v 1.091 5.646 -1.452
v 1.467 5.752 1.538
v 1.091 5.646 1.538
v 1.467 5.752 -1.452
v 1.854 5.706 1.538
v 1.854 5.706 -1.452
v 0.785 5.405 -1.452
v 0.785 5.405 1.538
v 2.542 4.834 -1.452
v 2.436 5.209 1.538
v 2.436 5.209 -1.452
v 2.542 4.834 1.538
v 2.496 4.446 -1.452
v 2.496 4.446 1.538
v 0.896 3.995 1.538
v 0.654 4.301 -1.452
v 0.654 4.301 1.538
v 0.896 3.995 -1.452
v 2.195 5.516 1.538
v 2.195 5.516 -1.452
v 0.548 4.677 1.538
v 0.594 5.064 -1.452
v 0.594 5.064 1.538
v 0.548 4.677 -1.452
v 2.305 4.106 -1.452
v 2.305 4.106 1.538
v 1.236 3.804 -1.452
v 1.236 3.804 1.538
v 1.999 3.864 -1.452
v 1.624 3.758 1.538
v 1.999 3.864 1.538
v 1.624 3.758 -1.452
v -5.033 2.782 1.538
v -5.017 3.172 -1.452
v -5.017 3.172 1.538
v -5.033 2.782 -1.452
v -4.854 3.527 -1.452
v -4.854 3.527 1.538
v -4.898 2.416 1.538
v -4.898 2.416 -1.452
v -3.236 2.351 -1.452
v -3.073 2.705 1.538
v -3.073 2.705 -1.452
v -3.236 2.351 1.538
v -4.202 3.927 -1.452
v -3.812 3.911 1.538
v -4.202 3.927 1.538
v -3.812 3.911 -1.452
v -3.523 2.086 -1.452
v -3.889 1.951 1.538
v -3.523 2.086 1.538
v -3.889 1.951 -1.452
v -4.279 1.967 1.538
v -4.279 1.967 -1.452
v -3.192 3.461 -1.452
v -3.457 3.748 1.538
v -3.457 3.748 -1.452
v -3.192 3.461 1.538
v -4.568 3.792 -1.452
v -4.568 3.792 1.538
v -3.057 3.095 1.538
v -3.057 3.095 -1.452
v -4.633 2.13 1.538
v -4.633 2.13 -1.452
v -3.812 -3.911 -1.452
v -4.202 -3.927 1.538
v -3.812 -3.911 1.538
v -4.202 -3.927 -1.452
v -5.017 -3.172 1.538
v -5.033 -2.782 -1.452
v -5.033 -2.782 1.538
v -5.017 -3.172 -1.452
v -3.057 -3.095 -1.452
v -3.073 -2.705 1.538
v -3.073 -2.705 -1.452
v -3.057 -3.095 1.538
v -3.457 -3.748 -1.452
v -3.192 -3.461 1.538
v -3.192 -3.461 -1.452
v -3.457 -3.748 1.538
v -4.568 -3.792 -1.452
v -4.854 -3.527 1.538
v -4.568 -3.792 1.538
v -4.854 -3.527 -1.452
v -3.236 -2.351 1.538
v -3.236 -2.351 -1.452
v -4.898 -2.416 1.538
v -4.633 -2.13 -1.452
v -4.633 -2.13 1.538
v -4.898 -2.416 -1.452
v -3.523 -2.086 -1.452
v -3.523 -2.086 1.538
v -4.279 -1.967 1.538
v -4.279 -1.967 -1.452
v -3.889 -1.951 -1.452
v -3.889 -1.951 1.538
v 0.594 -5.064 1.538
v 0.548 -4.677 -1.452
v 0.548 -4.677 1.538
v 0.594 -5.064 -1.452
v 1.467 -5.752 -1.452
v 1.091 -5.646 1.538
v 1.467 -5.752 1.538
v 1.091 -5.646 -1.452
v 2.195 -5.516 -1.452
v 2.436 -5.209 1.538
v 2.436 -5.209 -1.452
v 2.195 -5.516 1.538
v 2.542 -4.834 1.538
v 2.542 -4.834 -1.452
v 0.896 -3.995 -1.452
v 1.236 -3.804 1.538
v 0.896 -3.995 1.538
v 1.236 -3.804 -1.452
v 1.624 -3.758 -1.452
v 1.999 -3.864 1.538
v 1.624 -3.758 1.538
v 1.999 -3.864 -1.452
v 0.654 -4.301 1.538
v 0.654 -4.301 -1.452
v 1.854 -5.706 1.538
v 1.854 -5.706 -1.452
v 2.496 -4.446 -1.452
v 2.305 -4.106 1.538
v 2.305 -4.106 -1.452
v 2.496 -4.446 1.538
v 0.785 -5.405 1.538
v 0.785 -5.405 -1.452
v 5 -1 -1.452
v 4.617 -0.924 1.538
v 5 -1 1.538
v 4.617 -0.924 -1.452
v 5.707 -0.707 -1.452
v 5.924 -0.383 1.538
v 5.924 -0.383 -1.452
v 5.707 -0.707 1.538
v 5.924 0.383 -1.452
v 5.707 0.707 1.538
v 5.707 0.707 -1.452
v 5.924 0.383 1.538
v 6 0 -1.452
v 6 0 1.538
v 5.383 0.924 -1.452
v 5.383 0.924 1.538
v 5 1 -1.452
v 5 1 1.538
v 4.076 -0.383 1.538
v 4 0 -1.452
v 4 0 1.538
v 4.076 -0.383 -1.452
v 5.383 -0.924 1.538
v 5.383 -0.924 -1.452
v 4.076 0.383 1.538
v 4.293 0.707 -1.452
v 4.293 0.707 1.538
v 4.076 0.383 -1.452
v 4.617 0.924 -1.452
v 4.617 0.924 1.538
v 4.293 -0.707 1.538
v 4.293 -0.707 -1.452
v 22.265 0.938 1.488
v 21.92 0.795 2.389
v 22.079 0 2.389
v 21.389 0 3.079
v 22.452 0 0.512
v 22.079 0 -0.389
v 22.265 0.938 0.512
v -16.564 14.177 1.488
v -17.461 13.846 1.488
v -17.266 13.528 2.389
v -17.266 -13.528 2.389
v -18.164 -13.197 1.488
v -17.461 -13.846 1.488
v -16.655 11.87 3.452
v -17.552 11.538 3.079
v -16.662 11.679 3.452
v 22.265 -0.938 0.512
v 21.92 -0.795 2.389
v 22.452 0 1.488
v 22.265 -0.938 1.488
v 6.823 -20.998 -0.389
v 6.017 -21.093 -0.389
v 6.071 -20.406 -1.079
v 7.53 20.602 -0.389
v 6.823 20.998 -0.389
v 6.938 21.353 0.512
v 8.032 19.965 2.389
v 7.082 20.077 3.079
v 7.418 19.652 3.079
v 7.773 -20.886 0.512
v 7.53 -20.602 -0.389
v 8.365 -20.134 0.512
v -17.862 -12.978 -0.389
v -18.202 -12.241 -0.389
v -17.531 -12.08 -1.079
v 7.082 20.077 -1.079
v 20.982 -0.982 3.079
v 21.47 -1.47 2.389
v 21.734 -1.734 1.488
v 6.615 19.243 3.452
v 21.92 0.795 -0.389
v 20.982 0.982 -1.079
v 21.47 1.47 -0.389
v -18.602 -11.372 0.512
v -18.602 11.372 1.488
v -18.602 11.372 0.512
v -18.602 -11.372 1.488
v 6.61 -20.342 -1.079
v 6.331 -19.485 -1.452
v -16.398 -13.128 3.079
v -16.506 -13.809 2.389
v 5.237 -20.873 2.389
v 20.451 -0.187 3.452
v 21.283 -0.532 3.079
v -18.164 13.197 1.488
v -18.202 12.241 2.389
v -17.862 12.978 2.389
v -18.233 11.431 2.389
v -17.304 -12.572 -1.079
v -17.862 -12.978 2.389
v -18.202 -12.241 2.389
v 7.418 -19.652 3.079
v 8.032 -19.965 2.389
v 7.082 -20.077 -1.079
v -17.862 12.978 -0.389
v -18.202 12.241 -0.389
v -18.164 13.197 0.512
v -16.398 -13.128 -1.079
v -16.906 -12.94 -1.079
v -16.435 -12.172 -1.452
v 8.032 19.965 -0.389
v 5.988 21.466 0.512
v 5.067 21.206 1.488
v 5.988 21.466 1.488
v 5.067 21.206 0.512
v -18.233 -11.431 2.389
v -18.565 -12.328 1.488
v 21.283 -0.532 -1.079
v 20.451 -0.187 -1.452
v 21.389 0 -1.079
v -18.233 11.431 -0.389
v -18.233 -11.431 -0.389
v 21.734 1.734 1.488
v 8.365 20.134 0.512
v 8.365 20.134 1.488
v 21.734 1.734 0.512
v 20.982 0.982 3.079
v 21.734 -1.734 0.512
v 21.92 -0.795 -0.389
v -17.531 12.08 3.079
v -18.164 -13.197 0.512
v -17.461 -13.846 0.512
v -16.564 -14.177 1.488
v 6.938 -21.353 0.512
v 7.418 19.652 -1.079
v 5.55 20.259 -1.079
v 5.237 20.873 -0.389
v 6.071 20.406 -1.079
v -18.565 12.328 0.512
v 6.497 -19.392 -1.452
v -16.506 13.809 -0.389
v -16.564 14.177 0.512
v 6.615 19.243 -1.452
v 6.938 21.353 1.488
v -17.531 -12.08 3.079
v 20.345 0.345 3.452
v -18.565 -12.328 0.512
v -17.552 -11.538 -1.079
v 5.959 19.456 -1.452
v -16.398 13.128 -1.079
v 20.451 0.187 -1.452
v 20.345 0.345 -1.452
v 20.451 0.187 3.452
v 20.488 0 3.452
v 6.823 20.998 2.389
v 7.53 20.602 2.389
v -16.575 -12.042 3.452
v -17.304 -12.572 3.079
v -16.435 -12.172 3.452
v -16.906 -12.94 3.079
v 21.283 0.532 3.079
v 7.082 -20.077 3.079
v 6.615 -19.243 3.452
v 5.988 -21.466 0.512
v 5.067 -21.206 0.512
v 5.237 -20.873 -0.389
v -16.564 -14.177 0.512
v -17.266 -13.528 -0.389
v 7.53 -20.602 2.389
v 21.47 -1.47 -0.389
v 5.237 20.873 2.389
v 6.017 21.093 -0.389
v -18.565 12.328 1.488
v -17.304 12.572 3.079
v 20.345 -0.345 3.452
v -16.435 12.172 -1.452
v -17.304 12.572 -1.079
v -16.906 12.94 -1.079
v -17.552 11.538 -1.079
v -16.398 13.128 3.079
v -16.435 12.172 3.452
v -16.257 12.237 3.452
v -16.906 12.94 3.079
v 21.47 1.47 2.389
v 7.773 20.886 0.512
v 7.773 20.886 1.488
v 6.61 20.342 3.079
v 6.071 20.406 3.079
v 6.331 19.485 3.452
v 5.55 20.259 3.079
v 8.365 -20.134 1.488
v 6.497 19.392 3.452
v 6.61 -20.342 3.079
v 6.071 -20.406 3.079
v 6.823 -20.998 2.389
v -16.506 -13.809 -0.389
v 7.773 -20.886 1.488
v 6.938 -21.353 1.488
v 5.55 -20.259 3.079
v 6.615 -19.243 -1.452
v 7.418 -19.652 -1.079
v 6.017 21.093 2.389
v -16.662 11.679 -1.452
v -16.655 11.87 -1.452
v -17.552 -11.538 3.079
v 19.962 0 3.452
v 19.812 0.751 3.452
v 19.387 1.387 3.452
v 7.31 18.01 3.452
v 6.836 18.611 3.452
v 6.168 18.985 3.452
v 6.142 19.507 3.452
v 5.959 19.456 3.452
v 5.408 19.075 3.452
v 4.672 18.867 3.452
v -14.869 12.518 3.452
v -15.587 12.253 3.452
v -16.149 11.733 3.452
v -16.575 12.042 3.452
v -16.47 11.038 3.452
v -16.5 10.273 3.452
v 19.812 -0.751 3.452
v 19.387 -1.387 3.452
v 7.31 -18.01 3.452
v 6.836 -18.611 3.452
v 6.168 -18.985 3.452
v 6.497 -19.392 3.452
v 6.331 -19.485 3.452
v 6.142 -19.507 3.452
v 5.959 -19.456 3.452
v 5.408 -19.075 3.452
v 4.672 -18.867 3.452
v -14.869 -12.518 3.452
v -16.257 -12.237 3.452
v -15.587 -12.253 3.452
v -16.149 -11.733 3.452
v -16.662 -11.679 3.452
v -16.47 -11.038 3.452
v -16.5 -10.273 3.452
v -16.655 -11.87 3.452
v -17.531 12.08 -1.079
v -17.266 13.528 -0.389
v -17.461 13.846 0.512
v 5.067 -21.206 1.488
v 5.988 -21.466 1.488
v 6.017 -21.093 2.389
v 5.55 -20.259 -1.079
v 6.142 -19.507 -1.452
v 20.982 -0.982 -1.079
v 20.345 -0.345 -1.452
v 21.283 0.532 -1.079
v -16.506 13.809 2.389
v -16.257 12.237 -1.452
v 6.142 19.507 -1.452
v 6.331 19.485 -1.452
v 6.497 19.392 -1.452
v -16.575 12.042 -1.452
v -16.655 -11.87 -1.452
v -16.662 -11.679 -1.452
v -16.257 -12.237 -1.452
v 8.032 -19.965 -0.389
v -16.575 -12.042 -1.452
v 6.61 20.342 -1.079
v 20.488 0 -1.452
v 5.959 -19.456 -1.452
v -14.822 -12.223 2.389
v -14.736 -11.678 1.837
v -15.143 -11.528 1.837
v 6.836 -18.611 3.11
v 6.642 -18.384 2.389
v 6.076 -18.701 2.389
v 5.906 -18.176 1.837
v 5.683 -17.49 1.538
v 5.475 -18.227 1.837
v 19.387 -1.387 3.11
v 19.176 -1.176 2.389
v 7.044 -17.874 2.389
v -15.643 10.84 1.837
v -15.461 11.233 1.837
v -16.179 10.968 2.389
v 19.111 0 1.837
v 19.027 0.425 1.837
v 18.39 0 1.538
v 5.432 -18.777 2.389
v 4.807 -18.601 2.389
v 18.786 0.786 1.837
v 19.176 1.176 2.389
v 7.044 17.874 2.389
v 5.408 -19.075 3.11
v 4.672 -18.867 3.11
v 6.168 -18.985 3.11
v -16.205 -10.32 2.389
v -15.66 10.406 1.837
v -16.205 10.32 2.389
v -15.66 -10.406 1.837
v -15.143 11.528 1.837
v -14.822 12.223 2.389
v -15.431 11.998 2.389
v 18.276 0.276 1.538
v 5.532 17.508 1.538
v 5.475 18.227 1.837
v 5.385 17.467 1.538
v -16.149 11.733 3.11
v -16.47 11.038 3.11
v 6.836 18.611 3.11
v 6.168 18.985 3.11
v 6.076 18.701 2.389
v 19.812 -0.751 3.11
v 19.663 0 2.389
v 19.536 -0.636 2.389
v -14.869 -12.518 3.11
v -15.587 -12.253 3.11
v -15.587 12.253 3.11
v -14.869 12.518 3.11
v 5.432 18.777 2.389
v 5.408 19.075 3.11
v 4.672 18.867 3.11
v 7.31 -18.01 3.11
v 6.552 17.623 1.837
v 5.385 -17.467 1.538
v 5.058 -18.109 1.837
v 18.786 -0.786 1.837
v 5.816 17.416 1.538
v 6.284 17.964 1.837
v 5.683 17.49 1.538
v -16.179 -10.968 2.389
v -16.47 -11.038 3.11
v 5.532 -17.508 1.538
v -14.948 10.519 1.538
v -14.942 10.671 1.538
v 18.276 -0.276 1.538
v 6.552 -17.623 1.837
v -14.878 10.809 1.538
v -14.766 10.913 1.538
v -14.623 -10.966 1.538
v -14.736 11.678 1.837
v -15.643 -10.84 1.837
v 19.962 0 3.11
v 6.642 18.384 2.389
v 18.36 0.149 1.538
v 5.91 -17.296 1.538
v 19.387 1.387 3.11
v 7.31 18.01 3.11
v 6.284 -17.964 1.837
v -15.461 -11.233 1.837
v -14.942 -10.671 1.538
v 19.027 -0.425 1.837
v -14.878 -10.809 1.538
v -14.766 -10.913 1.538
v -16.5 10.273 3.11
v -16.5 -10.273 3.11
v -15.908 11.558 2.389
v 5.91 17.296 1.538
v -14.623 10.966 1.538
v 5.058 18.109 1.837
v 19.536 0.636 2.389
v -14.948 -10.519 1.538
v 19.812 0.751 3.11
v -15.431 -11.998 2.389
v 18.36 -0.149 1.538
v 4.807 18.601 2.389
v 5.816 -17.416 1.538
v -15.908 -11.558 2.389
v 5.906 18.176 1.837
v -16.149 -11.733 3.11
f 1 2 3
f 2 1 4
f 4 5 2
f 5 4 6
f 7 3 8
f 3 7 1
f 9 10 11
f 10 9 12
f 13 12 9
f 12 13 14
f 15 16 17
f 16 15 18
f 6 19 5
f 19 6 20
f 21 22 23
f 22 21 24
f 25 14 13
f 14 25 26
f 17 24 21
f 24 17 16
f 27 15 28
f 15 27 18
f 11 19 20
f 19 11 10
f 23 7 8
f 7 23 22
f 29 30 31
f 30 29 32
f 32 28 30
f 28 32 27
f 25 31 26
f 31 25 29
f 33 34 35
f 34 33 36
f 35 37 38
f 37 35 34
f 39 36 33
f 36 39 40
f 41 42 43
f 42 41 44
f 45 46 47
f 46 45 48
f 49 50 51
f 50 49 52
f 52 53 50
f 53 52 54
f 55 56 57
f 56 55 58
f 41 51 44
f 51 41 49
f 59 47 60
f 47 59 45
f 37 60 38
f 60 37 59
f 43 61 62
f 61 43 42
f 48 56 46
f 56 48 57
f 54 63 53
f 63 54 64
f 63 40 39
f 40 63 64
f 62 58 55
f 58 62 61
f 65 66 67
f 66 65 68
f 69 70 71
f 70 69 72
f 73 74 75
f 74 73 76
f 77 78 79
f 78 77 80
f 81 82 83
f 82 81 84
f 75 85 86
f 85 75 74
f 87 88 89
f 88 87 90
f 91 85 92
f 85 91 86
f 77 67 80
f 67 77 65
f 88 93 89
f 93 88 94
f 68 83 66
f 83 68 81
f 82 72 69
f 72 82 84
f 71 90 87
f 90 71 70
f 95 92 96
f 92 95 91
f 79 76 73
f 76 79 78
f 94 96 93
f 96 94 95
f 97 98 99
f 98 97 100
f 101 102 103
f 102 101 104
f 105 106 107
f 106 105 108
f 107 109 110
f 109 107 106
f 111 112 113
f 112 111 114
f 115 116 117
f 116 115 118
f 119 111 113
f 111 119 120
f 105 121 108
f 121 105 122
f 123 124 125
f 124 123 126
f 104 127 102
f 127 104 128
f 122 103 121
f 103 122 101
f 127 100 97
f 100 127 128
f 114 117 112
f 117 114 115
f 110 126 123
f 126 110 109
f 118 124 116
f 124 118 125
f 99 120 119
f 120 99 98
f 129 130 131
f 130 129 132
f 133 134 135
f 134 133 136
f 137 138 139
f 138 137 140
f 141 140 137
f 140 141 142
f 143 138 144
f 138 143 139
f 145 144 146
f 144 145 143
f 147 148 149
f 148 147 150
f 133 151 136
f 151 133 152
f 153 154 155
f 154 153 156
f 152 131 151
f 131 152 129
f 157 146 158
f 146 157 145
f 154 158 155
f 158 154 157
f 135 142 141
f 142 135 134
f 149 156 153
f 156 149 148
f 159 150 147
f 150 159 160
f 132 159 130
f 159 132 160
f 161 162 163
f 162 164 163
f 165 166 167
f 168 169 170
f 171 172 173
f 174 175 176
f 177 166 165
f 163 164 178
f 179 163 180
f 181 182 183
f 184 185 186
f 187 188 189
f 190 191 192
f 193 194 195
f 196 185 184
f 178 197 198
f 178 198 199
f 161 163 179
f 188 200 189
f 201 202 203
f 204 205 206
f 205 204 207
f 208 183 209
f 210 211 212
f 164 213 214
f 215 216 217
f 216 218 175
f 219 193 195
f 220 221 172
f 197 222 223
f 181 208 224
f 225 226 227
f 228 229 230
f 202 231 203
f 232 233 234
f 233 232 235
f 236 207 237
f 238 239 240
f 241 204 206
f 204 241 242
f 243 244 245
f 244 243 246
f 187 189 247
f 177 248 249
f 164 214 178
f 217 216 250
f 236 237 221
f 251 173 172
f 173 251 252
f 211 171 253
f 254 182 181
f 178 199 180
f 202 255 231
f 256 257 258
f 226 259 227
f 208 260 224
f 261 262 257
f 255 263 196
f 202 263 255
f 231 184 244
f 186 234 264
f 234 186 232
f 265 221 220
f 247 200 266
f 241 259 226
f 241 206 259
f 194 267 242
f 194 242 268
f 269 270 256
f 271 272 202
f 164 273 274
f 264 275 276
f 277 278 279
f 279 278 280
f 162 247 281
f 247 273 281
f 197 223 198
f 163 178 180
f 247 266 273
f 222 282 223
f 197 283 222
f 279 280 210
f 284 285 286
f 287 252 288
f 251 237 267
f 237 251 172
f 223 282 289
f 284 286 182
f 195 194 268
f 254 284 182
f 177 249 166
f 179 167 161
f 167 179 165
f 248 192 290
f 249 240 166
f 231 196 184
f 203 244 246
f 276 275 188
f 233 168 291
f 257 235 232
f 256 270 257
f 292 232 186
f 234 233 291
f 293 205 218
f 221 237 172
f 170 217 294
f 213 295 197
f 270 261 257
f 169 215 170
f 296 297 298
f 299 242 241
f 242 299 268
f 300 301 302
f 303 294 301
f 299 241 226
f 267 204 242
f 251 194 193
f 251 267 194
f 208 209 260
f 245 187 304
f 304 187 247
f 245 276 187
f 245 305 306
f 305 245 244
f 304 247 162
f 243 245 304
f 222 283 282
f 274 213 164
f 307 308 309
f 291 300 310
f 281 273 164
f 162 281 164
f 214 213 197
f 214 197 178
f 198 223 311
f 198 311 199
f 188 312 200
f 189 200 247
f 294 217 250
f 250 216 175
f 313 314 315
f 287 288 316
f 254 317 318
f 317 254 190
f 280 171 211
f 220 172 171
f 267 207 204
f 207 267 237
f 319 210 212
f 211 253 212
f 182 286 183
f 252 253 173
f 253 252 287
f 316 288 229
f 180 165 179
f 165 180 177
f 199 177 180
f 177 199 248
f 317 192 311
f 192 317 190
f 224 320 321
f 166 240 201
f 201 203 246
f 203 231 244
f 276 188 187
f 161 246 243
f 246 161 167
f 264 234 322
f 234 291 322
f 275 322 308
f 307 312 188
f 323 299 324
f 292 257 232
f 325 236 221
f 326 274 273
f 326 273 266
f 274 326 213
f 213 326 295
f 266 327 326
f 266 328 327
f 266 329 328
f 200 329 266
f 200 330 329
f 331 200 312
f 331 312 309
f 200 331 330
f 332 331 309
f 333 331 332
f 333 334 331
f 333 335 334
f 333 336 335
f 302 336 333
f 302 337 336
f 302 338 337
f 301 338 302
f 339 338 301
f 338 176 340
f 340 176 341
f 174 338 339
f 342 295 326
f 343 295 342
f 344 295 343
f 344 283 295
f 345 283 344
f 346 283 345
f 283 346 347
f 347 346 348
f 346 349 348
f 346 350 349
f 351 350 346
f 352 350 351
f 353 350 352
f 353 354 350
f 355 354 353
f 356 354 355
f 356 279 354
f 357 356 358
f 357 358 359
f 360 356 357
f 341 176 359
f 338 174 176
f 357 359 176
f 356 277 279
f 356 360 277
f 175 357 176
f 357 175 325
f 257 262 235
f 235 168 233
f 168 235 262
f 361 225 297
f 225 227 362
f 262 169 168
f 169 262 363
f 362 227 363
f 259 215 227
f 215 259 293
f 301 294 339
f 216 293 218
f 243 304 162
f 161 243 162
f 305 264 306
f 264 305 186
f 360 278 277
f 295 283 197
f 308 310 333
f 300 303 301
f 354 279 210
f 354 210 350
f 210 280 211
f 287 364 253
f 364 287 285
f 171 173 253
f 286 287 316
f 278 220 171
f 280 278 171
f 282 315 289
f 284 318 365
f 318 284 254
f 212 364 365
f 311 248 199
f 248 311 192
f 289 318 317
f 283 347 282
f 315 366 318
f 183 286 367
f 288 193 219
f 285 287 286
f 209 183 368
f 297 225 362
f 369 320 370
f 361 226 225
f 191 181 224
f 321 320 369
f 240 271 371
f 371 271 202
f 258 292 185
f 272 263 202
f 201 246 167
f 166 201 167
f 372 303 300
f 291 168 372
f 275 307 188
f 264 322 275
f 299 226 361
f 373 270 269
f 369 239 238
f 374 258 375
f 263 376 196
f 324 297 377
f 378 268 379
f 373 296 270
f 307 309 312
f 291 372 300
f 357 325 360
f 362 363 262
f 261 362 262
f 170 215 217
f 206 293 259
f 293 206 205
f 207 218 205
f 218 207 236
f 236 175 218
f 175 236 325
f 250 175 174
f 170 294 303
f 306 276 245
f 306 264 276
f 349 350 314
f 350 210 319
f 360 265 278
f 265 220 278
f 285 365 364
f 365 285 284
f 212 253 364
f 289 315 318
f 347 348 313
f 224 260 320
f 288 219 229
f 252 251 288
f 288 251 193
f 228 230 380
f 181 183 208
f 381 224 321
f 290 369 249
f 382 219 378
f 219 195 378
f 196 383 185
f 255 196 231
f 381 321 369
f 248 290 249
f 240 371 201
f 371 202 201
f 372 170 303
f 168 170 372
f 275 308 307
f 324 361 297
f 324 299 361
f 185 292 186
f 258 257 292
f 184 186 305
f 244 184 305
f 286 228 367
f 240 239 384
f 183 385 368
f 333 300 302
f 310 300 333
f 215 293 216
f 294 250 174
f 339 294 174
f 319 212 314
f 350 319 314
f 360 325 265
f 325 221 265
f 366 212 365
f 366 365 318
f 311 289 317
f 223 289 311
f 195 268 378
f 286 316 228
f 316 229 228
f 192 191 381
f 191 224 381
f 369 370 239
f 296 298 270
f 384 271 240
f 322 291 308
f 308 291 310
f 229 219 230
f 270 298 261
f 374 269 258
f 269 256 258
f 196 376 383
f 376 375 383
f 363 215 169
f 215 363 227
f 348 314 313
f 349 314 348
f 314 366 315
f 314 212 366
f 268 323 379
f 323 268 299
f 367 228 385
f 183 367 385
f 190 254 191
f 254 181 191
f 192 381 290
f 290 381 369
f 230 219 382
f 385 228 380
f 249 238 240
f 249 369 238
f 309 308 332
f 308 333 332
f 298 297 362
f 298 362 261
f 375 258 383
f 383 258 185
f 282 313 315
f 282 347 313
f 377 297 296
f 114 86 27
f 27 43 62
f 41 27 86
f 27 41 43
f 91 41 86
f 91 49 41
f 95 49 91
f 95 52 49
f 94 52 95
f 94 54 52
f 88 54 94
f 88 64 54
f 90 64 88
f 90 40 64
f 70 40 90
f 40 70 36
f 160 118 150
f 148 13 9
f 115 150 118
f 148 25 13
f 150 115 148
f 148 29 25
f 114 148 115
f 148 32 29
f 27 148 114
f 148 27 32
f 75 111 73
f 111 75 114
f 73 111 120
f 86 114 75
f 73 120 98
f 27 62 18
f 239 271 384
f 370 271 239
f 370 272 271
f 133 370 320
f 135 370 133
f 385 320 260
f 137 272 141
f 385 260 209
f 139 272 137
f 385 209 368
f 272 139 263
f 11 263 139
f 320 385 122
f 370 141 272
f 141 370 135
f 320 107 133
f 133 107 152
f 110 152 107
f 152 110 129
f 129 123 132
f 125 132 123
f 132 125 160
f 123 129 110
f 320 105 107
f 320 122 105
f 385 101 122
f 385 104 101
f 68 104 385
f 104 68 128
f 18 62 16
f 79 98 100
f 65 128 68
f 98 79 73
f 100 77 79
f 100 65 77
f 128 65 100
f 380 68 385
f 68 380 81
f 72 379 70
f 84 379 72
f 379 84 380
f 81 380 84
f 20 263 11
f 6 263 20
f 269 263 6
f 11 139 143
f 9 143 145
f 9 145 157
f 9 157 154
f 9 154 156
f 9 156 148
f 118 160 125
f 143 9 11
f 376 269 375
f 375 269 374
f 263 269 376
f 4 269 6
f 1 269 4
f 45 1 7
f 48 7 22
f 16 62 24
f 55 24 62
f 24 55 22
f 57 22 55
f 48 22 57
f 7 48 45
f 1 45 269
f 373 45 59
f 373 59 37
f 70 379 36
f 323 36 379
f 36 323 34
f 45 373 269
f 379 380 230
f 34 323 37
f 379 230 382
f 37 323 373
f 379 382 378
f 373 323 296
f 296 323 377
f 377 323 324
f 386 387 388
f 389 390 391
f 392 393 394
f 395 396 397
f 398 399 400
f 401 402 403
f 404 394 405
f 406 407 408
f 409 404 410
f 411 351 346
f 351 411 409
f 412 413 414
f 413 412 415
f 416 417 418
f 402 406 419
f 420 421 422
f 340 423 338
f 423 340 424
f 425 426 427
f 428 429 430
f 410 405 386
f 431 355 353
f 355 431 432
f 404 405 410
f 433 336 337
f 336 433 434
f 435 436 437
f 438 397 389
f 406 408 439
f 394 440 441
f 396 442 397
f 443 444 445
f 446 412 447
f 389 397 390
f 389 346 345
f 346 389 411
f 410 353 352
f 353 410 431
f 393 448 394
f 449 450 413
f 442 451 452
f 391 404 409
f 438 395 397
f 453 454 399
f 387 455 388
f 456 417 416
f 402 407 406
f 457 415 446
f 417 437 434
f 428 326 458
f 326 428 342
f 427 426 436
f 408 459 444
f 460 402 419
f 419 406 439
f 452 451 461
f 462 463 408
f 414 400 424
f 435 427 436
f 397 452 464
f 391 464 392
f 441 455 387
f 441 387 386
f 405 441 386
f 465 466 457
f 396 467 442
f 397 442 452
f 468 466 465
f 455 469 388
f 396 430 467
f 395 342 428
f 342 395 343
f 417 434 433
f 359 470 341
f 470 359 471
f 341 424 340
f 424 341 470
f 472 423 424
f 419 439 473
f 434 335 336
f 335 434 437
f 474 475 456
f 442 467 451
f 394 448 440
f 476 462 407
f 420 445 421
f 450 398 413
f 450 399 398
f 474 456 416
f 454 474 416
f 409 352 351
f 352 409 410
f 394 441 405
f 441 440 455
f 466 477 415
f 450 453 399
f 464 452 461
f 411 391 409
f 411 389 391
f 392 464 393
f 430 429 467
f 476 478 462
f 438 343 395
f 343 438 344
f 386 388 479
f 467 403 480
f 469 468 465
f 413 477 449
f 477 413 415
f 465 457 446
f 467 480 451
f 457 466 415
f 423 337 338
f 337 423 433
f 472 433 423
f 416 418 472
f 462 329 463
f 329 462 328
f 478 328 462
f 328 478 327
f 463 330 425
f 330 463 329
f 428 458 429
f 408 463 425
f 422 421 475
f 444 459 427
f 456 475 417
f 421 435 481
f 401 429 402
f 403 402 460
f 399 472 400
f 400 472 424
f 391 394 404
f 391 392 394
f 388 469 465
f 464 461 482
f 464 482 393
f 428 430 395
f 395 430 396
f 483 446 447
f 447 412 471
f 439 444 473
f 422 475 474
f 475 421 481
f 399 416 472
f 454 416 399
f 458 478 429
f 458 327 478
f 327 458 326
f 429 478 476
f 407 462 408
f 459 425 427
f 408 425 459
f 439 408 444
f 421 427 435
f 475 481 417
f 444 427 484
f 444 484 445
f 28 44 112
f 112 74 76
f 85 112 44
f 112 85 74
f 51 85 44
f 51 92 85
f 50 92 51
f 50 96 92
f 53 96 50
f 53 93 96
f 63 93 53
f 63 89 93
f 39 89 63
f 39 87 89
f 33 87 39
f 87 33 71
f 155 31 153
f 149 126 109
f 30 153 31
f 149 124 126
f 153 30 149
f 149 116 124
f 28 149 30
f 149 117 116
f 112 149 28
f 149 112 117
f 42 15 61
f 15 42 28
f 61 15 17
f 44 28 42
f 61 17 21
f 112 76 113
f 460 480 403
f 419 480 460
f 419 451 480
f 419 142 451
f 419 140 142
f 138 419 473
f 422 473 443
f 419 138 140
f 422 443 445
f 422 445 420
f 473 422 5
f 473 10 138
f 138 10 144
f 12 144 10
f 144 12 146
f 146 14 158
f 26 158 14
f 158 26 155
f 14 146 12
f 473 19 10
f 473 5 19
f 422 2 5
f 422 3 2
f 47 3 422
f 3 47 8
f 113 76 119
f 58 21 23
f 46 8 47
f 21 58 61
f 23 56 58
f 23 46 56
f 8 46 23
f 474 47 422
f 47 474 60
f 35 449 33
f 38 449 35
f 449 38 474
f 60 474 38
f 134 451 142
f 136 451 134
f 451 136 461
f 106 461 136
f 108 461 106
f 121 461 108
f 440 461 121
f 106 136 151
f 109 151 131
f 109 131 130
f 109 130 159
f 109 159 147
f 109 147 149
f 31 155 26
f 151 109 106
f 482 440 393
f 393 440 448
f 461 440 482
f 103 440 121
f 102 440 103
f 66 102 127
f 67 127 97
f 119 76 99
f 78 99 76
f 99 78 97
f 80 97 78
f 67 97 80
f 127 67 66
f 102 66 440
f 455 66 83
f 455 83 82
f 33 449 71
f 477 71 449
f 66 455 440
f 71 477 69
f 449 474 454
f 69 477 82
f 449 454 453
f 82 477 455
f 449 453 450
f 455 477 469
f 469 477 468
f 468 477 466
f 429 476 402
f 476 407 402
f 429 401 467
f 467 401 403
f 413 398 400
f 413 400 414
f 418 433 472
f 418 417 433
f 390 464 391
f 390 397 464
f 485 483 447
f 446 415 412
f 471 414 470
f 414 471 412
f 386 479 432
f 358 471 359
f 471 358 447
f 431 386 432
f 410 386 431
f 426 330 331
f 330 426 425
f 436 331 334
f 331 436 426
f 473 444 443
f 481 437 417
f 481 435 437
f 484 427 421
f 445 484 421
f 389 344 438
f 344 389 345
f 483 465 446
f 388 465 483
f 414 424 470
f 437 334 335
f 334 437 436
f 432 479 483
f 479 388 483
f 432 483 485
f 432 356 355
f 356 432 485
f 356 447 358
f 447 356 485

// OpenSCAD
// Générateurs de boutons
// Par Vanlindt Marc (www.vanlindt.be)
/* [Variables générales] */

// Choix du type de bouton
TypeDeBouton="lissé";//[forme,lissé]


// Exprimé en mm.
HauteurDuBouton=3;

// Exprimé en mm.
RayonDuBouton=20;

// Nombre de faces au boutons :
Forme=5;

/* [Rebord] */
// Rebord
Rebord="true";//[true,false]

// Epaisseur du rebord (en mm)
EpaisseurDuRebord=2;

// Hauteur du rebord (en mm)
HauteurDuRebord=2;

/* [Trous] */
// Nombre de trous 
NombreDeTrous=5;

// Distance d'un trou par rapport au centre (en mm)
DistanceTrou=5;

// Diamètre d'un trou (en mm)
DiametreTrou=2;

// Rotation des trous
RotationsDesTrous=0;//[0:360]

/* [Lissage] */
QualiteDuLissage=2;//[1:4]


bouton();



module bouton()
{
if (TypeDeBouton=="forme")
{    
    difference()
    {
	if (Rebord=="true")
	{
            difference()
            {
                union()
		{
                    cylinder(r=RayonDuBouton,h=HauteurDuBouton,center=true,$fn=Forme);
                    difference()
                    {
                        cylinder(r=RayonDuBouton,h=HauteurDuBouton+HauteurDuRebord,center=true,$fn=Forme);
			cylinder(r=RayonDuBouton-EpaisseurDuRebord,h=HauteurDuBouton+HauteurDuRebord*2,center=true,$fn=Forme);
                    }
		}
                rotate([0,0,RotationsDesTrous])
                for (i=[1:NombreDeTrous])	
                {
                    rotate([0,0,i*360/NombreDeTrous])
                    translate([DistanceTrou,0,0])
                    cylinder(r=DiametreTrou/2,h=HauteurDuBouton*20,$fn=16,center=true);
                }
            }
        }
       	if (Rebord=="false")
	{
            difference()
            {
                cylinder(r=RayonDuBouton,h=HauteurDuBouton,center=true,$fn=Forme);
                rotate([0,0,RotationsDesTrous])
                for (i=[1:NombreDeTrous])	
                {
                    rotate([0,0,i*360/NombreDeTrous])
                    translate([DistanceTrou,0,0])
                    cylinder(r=DiametreTrou/2,h=HauteurDuBouton*20,$fn=16,center=true);
                }
            }
        }
        translate([0,0,-HauteurDuBouton])
        cube([RayonDuBouton*2,RayonDuBouton*2,HauteurDuBouton],center=true);
    }
}
if (TypeDeBouton=="lissé")
{    
    difference()
    {
	if (Rebord=="true")
	{
            difference()
            {
                translate([0,0,HauteurDuRebord/2])
                hull()
                {
                for (i=[1:Forme])
                {
                    rotate([0,0,i*360/Forme])
                    translate([RayonDuBouton,0,0])
                    sphere(r=HauteurDuBouton/2+HauteurDuRebord/2,$fn=8*QualiteDuLissage);
                }
                }
                
                rotate([0,0,RotationsDesTrous])
                for (i=[1:NombreDeTrous])	
                {
                    rotate([0,0,i*360/NombreDeTrous])
                    translate([DistanceTrou,0,0])
                    cylinder(r=DiametreTrou/2,h=HauteurDuBouton*20,$fn=8*QualiteDuLissage,center=true);
                }
                translate([0,0,HauteurDuBouton/2+HauteurDuRebord])
               hull()
                {
                    for (i=[1:Forme])
                    {
                        rotate([0,0,i*360/Forme])
                        translate([RayonDuBouton-EpaisseurDuRebord,0,0])
                        sphere(r=HauteurDuRebord,$fn=8*QualiteDuLissage);
                
                    }
                }
            }            
            
        }  
       	if (Rebord=="false")
	{
            difference()
            {
                hull()
                {
                for (i=[1:Forme])
                {
                    rotate([0,0,i*360/Forme])
                    translate([RayonDuBouton,0,0])
                    sphere(r=HauteurDuBouton/2,$fn=8*QualiteDuLissage);
                }
                }
                
                rotate([0,0,RotationsDesTrous])
                for (i=[1:NombreDeTrous])	
                {
                    rotate([0,0,i*360/NombreDeTrous])
                    translate([DistanceTrou,0,0])
                    cylinder(r=DiametreTrou/2,h=HauteurDuBouton*20,$fn=8*QualiteDuLissage,center=true);
                }
            }
        }

    }

}

}
